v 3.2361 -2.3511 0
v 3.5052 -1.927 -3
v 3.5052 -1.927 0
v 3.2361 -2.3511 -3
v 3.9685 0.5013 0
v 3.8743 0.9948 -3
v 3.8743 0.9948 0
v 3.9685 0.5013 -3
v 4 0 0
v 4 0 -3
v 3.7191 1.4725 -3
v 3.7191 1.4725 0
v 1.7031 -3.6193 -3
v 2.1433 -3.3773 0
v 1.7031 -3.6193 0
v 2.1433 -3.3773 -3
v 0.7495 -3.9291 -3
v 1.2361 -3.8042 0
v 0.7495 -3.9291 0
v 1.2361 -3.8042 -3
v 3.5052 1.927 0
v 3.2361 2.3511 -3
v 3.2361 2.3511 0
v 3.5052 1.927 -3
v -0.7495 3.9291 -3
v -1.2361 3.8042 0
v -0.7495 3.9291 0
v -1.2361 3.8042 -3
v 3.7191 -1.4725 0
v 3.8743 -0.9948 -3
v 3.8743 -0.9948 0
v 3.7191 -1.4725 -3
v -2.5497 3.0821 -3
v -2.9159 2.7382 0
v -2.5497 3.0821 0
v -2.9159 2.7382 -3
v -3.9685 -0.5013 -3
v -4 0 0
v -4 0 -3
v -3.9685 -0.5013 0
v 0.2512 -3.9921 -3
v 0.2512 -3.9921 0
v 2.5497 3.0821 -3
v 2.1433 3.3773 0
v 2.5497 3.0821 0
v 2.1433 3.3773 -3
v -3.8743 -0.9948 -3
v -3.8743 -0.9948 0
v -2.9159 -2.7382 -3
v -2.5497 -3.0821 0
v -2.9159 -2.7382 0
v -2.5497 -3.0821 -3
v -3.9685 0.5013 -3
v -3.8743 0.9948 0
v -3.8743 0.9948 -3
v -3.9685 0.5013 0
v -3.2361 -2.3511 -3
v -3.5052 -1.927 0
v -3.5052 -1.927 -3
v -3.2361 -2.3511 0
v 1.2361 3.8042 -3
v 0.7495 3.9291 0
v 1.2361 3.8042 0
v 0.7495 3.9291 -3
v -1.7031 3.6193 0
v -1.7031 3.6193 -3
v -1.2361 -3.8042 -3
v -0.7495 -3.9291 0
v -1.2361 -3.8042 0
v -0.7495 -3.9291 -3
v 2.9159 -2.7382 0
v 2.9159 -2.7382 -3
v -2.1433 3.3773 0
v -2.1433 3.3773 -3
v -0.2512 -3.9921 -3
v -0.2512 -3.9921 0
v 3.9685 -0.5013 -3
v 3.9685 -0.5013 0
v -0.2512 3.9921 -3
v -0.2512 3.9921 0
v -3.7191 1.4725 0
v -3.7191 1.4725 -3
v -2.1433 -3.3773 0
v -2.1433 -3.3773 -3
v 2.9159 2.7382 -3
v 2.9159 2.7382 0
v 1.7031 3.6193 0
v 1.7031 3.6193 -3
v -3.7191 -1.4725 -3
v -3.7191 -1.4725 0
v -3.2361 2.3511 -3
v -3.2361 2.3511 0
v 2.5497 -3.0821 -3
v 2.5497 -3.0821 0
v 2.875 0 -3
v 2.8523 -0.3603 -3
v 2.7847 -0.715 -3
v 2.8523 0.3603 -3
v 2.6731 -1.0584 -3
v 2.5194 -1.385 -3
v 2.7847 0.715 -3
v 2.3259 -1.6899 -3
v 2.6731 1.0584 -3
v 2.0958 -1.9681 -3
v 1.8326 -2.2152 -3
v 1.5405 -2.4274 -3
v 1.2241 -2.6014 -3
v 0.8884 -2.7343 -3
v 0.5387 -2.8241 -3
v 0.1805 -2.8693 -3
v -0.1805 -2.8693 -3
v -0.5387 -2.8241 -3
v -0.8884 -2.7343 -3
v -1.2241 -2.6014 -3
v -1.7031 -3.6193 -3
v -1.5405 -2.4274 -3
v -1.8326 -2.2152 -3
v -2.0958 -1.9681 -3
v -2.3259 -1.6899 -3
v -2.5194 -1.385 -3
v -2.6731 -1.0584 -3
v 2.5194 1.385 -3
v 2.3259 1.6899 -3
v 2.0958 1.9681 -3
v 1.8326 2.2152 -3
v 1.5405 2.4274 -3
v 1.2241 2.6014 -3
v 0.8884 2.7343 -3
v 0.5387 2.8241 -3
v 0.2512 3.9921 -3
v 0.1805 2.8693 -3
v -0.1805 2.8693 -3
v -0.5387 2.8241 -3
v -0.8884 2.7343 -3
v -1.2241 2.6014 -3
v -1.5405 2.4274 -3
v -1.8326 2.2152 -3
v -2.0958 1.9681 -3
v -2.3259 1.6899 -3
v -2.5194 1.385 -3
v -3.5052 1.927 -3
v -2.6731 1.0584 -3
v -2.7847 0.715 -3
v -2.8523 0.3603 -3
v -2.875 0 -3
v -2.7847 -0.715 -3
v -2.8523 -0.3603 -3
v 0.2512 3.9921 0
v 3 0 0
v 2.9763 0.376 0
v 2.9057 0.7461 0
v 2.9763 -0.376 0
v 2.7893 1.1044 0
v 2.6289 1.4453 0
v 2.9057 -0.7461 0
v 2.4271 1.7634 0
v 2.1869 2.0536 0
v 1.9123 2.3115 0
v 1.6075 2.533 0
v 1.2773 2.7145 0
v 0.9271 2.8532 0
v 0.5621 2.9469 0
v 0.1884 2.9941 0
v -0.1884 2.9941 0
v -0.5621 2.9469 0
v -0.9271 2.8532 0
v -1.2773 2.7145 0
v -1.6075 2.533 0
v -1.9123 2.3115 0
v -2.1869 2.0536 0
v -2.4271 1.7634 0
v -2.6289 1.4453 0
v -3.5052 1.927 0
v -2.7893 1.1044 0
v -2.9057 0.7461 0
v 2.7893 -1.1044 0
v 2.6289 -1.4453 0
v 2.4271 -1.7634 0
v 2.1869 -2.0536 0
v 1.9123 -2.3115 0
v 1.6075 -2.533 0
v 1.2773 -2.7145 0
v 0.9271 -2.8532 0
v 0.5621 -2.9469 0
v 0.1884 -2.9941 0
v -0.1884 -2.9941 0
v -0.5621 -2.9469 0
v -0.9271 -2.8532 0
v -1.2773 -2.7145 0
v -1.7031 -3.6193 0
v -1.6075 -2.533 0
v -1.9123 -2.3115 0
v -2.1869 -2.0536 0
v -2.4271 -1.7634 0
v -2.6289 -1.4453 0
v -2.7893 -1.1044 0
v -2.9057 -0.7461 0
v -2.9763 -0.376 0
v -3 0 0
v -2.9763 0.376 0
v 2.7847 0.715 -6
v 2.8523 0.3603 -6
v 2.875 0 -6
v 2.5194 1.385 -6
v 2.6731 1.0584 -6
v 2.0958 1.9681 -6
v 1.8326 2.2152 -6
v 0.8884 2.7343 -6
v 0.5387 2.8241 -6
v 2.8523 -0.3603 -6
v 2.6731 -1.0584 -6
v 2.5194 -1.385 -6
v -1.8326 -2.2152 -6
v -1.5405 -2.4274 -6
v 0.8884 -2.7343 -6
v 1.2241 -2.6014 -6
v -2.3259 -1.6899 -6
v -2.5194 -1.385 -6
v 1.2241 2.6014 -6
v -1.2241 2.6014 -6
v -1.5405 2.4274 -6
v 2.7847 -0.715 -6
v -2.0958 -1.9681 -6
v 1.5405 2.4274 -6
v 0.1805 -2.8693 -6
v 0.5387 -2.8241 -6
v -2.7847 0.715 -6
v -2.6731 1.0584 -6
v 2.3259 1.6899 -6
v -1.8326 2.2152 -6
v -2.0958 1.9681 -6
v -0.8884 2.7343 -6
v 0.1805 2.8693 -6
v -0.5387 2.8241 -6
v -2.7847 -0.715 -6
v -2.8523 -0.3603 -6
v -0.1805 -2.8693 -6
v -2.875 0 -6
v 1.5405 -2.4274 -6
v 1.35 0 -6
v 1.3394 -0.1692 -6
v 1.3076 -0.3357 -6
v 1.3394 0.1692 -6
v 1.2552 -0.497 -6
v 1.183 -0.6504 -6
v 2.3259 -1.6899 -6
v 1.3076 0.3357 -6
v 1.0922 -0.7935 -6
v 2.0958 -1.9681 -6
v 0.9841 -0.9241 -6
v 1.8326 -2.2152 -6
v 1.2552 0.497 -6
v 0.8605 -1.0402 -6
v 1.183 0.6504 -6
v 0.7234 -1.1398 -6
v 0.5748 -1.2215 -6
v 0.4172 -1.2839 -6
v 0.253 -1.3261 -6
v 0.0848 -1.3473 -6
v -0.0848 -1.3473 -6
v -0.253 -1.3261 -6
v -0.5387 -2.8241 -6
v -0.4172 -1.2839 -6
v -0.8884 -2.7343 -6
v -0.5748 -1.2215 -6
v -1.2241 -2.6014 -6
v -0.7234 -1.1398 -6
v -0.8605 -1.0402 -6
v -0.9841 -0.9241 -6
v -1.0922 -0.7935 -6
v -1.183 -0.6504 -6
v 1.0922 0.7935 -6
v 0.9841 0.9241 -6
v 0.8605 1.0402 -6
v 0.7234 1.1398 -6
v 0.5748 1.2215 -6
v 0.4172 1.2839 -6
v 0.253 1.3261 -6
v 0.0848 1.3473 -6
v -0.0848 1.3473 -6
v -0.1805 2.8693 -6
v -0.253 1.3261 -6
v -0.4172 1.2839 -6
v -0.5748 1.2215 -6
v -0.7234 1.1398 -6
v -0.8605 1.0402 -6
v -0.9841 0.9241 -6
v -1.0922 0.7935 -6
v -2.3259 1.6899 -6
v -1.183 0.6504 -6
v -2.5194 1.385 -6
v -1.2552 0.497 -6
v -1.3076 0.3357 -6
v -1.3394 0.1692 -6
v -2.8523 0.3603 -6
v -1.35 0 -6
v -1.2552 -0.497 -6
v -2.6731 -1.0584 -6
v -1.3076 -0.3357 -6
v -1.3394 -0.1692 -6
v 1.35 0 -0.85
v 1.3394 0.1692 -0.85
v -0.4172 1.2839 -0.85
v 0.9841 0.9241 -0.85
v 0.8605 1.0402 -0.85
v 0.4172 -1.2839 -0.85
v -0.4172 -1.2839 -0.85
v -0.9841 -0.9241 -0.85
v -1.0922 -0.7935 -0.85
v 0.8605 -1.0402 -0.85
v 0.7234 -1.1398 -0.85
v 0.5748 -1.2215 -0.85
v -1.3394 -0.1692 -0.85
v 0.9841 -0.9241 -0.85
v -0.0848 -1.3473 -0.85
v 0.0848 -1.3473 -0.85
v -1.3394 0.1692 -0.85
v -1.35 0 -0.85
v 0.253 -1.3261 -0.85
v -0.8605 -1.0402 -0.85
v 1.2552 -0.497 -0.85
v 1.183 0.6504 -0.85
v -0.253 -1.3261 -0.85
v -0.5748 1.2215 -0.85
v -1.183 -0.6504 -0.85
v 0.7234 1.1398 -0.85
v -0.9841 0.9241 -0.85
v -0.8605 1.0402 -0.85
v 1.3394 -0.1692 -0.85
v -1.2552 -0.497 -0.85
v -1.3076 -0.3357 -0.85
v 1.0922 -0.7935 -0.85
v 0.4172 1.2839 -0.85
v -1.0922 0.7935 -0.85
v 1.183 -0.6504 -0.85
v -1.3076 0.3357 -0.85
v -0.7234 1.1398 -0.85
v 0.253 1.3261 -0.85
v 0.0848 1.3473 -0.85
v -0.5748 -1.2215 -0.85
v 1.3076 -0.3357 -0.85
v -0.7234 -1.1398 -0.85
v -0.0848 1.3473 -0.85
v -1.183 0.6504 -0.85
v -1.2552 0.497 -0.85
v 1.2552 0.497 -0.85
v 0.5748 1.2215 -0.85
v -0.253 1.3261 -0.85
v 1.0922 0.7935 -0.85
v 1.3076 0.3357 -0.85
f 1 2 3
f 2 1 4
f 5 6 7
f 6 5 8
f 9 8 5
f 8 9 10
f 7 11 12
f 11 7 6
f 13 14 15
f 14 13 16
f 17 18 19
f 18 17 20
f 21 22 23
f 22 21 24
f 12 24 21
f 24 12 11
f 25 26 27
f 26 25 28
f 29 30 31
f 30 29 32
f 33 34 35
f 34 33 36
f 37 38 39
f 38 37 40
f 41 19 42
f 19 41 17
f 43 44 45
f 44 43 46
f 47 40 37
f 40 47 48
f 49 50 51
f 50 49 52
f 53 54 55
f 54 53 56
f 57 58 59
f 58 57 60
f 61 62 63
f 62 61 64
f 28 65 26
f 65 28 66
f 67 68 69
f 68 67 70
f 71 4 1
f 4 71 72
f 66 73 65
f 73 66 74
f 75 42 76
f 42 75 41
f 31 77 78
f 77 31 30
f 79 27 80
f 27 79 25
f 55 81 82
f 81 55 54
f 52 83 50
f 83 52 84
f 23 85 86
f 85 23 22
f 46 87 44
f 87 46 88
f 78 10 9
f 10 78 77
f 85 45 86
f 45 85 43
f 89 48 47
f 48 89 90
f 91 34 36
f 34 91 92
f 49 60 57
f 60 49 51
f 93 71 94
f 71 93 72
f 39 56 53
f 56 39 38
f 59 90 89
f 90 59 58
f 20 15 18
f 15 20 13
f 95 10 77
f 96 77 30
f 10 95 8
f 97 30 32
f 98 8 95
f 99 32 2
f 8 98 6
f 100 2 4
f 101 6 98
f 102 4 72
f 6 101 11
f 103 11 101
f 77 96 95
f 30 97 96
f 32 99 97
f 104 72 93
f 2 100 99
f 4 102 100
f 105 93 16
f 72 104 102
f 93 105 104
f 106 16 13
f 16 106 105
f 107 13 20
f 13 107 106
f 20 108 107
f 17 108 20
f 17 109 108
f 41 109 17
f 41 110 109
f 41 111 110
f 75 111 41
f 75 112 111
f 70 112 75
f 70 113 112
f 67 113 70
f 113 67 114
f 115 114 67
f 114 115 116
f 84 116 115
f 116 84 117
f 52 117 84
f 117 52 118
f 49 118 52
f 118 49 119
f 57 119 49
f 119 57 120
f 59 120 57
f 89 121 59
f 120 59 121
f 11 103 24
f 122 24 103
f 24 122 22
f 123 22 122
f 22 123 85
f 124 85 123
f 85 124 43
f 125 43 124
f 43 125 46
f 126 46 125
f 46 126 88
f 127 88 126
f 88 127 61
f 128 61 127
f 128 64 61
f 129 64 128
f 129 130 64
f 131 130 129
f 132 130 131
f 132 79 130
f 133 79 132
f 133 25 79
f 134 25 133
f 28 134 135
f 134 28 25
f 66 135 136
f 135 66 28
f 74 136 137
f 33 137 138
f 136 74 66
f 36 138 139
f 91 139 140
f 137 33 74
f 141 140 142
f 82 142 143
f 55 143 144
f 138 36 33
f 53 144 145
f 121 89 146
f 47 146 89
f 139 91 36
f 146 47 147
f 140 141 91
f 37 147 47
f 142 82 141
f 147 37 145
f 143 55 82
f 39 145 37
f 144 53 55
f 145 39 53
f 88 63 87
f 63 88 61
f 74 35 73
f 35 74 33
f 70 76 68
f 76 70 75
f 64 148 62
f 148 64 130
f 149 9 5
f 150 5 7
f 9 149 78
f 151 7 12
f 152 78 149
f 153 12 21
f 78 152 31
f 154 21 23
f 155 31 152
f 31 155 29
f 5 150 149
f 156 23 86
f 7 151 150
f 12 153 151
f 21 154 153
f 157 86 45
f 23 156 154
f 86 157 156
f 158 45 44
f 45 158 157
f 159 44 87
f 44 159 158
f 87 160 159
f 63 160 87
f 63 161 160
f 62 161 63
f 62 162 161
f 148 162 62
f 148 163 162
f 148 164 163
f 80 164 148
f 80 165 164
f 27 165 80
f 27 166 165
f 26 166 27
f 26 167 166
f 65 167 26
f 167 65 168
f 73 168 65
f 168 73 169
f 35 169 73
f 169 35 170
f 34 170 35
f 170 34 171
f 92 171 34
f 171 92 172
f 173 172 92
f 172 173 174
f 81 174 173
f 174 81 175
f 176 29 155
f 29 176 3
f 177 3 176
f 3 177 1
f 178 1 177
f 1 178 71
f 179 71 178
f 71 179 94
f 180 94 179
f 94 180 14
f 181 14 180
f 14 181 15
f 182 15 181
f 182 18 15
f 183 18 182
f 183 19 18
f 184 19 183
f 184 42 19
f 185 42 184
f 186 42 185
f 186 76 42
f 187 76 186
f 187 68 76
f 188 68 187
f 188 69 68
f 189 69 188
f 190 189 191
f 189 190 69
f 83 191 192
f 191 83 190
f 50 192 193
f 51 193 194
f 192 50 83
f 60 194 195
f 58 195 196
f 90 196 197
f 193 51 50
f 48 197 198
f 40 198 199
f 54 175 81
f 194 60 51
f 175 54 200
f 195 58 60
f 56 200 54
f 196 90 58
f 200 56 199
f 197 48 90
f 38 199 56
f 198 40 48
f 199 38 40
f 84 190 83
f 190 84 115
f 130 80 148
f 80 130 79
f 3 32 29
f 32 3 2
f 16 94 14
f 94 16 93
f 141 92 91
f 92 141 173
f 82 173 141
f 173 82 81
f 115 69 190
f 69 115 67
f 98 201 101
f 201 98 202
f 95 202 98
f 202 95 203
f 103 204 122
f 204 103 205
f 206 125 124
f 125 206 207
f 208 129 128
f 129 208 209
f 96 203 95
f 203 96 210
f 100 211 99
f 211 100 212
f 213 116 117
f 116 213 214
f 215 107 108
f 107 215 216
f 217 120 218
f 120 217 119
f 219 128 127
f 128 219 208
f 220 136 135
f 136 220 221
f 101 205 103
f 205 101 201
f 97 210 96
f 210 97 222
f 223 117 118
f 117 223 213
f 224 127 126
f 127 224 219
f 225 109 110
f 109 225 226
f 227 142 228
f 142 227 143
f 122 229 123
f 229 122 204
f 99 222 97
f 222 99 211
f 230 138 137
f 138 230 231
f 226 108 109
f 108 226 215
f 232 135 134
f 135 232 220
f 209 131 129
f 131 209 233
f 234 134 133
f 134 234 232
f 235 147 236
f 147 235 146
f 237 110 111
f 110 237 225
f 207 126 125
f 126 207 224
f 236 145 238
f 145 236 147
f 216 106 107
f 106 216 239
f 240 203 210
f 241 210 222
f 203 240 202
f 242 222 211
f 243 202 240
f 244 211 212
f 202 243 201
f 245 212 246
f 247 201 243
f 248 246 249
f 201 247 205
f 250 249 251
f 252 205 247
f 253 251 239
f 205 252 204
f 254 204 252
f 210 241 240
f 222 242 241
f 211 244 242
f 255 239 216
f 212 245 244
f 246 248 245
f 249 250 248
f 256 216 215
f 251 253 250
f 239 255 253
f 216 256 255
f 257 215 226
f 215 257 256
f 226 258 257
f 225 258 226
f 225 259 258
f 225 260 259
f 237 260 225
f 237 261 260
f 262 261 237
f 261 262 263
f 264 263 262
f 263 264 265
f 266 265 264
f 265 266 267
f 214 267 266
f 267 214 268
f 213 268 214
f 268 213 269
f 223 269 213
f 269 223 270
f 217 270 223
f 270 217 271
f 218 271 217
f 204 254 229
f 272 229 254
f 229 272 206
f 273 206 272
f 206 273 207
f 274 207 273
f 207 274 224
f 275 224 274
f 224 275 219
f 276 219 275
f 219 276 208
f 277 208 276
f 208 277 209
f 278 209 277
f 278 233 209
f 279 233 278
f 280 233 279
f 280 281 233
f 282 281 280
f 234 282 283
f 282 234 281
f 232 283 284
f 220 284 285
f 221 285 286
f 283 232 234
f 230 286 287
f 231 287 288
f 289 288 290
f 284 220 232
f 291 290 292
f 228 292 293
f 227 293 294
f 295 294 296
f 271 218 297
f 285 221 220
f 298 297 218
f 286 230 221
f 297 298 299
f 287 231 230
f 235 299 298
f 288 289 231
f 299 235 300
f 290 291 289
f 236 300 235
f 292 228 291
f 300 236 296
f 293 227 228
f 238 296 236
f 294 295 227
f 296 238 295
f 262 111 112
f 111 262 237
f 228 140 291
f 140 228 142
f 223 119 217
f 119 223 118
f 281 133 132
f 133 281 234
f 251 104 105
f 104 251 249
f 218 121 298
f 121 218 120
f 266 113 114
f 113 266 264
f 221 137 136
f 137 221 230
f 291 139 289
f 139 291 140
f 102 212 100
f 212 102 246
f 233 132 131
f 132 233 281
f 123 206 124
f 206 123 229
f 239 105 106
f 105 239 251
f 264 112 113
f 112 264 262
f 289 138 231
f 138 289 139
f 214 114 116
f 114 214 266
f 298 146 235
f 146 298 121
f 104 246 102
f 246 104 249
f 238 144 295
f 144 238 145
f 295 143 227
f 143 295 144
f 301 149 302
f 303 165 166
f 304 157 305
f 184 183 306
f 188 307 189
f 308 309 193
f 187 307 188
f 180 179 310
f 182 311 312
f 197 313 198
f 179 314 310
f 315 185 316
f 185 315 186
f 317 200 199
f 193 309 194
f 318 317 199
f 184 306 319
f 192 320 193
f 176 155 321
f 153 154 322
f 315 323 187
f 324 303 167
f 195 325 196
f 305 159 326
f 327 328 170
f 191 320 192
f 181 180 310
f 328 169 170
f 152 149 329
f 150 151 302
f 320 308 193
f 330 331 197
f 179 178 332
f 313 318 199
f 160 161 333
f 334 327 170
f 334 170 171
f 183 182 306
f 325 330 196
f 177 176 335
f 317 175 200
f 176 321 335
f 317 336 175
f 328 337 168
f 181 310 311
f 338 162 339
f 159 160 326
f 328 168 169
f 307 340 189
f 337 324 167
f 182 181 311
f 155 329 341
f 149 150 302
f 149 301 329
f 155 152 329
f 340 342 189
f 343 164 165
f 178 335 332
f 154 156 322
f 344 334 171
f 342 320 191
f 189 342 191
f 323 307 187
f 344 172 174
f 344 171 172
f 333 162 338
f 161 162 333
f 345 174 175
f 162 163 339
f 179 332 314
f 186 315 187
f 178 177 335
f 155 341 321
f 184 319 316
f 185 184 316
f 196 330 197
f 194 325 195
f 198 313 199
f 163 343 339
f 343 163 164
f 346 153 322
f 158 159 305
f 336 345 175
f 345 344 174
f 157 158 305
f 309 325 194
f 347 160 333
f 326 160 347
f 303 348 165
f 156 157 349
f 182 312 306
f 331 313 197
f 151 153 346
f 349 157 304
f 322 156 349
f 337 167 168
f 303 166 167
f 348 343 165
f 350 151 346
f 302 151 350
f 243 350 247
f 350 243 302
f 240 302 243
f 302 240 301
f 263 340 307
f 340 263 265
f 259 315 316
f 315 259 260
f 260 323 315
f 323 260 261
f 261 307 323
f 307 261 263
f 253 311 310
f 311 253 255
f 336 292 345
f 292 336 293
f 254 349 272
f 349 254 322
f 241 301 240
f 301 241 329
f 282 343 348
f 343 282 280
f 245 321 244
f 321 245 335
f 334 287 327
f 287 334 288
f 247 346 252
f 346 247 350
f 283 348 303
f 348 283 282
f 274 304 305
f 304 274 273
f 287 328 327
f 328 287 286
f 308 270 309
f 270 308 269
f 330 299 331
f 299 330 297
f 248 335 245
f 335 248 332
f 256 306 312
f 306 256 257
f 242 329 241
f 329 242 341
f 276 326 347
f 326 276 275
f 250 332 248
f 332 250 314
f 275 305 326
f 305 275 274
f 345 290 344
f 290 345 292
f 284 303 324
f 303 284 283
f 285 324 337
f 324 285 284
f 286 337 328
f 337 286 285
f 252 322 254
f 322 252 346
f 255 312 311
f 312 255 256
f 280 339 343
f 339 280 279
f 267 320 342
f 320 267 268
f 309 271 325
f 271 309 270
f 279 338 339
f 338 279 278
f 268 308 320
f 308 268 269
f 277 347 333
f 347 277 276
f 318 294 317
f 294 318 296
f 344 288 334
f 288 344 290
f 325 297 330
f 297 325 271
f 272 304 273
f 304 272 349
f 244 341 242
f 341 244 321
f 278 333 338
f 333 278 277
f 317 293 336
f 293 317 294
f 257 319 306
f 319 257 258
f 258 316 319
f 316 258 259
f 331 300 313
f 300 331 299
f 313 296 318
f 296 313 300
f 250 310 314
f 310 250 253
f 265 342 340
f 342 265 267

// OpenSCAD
$fn = 50;

difference() {
	union() {
		translate(v = [0, 0, -3.0]) {
			cylinder(h = 3, r = 4.0);
		}
		#translate(v = [0, 0, -6.0]) {
			cylinder(h = 6, r = 2.875);
		}
	}
	union() {
		translate(v = [0, 0, 0]) {
			rotate(a = [0, 0, 0]) {
				difference() {
					union() {
						translate(v = [0, 0, -6.0]) {
							cylinder(h = 6, r = 1.0);
						}
						translate(v = [0, 0, -0.85]) {
							cylinder(h = 0.85, r1 = 1.35, r2 = 3.0);
						}
						translate(v = [0, 0, -6.0]) {
							cylinder(h = 6, r = 1.35);
						}
						translate(v = [0, 0, -6.0]) {
							cylinder(h = 6, r = 1.0);
						}
					}
					union();
				}
			}
		}
	}
}
